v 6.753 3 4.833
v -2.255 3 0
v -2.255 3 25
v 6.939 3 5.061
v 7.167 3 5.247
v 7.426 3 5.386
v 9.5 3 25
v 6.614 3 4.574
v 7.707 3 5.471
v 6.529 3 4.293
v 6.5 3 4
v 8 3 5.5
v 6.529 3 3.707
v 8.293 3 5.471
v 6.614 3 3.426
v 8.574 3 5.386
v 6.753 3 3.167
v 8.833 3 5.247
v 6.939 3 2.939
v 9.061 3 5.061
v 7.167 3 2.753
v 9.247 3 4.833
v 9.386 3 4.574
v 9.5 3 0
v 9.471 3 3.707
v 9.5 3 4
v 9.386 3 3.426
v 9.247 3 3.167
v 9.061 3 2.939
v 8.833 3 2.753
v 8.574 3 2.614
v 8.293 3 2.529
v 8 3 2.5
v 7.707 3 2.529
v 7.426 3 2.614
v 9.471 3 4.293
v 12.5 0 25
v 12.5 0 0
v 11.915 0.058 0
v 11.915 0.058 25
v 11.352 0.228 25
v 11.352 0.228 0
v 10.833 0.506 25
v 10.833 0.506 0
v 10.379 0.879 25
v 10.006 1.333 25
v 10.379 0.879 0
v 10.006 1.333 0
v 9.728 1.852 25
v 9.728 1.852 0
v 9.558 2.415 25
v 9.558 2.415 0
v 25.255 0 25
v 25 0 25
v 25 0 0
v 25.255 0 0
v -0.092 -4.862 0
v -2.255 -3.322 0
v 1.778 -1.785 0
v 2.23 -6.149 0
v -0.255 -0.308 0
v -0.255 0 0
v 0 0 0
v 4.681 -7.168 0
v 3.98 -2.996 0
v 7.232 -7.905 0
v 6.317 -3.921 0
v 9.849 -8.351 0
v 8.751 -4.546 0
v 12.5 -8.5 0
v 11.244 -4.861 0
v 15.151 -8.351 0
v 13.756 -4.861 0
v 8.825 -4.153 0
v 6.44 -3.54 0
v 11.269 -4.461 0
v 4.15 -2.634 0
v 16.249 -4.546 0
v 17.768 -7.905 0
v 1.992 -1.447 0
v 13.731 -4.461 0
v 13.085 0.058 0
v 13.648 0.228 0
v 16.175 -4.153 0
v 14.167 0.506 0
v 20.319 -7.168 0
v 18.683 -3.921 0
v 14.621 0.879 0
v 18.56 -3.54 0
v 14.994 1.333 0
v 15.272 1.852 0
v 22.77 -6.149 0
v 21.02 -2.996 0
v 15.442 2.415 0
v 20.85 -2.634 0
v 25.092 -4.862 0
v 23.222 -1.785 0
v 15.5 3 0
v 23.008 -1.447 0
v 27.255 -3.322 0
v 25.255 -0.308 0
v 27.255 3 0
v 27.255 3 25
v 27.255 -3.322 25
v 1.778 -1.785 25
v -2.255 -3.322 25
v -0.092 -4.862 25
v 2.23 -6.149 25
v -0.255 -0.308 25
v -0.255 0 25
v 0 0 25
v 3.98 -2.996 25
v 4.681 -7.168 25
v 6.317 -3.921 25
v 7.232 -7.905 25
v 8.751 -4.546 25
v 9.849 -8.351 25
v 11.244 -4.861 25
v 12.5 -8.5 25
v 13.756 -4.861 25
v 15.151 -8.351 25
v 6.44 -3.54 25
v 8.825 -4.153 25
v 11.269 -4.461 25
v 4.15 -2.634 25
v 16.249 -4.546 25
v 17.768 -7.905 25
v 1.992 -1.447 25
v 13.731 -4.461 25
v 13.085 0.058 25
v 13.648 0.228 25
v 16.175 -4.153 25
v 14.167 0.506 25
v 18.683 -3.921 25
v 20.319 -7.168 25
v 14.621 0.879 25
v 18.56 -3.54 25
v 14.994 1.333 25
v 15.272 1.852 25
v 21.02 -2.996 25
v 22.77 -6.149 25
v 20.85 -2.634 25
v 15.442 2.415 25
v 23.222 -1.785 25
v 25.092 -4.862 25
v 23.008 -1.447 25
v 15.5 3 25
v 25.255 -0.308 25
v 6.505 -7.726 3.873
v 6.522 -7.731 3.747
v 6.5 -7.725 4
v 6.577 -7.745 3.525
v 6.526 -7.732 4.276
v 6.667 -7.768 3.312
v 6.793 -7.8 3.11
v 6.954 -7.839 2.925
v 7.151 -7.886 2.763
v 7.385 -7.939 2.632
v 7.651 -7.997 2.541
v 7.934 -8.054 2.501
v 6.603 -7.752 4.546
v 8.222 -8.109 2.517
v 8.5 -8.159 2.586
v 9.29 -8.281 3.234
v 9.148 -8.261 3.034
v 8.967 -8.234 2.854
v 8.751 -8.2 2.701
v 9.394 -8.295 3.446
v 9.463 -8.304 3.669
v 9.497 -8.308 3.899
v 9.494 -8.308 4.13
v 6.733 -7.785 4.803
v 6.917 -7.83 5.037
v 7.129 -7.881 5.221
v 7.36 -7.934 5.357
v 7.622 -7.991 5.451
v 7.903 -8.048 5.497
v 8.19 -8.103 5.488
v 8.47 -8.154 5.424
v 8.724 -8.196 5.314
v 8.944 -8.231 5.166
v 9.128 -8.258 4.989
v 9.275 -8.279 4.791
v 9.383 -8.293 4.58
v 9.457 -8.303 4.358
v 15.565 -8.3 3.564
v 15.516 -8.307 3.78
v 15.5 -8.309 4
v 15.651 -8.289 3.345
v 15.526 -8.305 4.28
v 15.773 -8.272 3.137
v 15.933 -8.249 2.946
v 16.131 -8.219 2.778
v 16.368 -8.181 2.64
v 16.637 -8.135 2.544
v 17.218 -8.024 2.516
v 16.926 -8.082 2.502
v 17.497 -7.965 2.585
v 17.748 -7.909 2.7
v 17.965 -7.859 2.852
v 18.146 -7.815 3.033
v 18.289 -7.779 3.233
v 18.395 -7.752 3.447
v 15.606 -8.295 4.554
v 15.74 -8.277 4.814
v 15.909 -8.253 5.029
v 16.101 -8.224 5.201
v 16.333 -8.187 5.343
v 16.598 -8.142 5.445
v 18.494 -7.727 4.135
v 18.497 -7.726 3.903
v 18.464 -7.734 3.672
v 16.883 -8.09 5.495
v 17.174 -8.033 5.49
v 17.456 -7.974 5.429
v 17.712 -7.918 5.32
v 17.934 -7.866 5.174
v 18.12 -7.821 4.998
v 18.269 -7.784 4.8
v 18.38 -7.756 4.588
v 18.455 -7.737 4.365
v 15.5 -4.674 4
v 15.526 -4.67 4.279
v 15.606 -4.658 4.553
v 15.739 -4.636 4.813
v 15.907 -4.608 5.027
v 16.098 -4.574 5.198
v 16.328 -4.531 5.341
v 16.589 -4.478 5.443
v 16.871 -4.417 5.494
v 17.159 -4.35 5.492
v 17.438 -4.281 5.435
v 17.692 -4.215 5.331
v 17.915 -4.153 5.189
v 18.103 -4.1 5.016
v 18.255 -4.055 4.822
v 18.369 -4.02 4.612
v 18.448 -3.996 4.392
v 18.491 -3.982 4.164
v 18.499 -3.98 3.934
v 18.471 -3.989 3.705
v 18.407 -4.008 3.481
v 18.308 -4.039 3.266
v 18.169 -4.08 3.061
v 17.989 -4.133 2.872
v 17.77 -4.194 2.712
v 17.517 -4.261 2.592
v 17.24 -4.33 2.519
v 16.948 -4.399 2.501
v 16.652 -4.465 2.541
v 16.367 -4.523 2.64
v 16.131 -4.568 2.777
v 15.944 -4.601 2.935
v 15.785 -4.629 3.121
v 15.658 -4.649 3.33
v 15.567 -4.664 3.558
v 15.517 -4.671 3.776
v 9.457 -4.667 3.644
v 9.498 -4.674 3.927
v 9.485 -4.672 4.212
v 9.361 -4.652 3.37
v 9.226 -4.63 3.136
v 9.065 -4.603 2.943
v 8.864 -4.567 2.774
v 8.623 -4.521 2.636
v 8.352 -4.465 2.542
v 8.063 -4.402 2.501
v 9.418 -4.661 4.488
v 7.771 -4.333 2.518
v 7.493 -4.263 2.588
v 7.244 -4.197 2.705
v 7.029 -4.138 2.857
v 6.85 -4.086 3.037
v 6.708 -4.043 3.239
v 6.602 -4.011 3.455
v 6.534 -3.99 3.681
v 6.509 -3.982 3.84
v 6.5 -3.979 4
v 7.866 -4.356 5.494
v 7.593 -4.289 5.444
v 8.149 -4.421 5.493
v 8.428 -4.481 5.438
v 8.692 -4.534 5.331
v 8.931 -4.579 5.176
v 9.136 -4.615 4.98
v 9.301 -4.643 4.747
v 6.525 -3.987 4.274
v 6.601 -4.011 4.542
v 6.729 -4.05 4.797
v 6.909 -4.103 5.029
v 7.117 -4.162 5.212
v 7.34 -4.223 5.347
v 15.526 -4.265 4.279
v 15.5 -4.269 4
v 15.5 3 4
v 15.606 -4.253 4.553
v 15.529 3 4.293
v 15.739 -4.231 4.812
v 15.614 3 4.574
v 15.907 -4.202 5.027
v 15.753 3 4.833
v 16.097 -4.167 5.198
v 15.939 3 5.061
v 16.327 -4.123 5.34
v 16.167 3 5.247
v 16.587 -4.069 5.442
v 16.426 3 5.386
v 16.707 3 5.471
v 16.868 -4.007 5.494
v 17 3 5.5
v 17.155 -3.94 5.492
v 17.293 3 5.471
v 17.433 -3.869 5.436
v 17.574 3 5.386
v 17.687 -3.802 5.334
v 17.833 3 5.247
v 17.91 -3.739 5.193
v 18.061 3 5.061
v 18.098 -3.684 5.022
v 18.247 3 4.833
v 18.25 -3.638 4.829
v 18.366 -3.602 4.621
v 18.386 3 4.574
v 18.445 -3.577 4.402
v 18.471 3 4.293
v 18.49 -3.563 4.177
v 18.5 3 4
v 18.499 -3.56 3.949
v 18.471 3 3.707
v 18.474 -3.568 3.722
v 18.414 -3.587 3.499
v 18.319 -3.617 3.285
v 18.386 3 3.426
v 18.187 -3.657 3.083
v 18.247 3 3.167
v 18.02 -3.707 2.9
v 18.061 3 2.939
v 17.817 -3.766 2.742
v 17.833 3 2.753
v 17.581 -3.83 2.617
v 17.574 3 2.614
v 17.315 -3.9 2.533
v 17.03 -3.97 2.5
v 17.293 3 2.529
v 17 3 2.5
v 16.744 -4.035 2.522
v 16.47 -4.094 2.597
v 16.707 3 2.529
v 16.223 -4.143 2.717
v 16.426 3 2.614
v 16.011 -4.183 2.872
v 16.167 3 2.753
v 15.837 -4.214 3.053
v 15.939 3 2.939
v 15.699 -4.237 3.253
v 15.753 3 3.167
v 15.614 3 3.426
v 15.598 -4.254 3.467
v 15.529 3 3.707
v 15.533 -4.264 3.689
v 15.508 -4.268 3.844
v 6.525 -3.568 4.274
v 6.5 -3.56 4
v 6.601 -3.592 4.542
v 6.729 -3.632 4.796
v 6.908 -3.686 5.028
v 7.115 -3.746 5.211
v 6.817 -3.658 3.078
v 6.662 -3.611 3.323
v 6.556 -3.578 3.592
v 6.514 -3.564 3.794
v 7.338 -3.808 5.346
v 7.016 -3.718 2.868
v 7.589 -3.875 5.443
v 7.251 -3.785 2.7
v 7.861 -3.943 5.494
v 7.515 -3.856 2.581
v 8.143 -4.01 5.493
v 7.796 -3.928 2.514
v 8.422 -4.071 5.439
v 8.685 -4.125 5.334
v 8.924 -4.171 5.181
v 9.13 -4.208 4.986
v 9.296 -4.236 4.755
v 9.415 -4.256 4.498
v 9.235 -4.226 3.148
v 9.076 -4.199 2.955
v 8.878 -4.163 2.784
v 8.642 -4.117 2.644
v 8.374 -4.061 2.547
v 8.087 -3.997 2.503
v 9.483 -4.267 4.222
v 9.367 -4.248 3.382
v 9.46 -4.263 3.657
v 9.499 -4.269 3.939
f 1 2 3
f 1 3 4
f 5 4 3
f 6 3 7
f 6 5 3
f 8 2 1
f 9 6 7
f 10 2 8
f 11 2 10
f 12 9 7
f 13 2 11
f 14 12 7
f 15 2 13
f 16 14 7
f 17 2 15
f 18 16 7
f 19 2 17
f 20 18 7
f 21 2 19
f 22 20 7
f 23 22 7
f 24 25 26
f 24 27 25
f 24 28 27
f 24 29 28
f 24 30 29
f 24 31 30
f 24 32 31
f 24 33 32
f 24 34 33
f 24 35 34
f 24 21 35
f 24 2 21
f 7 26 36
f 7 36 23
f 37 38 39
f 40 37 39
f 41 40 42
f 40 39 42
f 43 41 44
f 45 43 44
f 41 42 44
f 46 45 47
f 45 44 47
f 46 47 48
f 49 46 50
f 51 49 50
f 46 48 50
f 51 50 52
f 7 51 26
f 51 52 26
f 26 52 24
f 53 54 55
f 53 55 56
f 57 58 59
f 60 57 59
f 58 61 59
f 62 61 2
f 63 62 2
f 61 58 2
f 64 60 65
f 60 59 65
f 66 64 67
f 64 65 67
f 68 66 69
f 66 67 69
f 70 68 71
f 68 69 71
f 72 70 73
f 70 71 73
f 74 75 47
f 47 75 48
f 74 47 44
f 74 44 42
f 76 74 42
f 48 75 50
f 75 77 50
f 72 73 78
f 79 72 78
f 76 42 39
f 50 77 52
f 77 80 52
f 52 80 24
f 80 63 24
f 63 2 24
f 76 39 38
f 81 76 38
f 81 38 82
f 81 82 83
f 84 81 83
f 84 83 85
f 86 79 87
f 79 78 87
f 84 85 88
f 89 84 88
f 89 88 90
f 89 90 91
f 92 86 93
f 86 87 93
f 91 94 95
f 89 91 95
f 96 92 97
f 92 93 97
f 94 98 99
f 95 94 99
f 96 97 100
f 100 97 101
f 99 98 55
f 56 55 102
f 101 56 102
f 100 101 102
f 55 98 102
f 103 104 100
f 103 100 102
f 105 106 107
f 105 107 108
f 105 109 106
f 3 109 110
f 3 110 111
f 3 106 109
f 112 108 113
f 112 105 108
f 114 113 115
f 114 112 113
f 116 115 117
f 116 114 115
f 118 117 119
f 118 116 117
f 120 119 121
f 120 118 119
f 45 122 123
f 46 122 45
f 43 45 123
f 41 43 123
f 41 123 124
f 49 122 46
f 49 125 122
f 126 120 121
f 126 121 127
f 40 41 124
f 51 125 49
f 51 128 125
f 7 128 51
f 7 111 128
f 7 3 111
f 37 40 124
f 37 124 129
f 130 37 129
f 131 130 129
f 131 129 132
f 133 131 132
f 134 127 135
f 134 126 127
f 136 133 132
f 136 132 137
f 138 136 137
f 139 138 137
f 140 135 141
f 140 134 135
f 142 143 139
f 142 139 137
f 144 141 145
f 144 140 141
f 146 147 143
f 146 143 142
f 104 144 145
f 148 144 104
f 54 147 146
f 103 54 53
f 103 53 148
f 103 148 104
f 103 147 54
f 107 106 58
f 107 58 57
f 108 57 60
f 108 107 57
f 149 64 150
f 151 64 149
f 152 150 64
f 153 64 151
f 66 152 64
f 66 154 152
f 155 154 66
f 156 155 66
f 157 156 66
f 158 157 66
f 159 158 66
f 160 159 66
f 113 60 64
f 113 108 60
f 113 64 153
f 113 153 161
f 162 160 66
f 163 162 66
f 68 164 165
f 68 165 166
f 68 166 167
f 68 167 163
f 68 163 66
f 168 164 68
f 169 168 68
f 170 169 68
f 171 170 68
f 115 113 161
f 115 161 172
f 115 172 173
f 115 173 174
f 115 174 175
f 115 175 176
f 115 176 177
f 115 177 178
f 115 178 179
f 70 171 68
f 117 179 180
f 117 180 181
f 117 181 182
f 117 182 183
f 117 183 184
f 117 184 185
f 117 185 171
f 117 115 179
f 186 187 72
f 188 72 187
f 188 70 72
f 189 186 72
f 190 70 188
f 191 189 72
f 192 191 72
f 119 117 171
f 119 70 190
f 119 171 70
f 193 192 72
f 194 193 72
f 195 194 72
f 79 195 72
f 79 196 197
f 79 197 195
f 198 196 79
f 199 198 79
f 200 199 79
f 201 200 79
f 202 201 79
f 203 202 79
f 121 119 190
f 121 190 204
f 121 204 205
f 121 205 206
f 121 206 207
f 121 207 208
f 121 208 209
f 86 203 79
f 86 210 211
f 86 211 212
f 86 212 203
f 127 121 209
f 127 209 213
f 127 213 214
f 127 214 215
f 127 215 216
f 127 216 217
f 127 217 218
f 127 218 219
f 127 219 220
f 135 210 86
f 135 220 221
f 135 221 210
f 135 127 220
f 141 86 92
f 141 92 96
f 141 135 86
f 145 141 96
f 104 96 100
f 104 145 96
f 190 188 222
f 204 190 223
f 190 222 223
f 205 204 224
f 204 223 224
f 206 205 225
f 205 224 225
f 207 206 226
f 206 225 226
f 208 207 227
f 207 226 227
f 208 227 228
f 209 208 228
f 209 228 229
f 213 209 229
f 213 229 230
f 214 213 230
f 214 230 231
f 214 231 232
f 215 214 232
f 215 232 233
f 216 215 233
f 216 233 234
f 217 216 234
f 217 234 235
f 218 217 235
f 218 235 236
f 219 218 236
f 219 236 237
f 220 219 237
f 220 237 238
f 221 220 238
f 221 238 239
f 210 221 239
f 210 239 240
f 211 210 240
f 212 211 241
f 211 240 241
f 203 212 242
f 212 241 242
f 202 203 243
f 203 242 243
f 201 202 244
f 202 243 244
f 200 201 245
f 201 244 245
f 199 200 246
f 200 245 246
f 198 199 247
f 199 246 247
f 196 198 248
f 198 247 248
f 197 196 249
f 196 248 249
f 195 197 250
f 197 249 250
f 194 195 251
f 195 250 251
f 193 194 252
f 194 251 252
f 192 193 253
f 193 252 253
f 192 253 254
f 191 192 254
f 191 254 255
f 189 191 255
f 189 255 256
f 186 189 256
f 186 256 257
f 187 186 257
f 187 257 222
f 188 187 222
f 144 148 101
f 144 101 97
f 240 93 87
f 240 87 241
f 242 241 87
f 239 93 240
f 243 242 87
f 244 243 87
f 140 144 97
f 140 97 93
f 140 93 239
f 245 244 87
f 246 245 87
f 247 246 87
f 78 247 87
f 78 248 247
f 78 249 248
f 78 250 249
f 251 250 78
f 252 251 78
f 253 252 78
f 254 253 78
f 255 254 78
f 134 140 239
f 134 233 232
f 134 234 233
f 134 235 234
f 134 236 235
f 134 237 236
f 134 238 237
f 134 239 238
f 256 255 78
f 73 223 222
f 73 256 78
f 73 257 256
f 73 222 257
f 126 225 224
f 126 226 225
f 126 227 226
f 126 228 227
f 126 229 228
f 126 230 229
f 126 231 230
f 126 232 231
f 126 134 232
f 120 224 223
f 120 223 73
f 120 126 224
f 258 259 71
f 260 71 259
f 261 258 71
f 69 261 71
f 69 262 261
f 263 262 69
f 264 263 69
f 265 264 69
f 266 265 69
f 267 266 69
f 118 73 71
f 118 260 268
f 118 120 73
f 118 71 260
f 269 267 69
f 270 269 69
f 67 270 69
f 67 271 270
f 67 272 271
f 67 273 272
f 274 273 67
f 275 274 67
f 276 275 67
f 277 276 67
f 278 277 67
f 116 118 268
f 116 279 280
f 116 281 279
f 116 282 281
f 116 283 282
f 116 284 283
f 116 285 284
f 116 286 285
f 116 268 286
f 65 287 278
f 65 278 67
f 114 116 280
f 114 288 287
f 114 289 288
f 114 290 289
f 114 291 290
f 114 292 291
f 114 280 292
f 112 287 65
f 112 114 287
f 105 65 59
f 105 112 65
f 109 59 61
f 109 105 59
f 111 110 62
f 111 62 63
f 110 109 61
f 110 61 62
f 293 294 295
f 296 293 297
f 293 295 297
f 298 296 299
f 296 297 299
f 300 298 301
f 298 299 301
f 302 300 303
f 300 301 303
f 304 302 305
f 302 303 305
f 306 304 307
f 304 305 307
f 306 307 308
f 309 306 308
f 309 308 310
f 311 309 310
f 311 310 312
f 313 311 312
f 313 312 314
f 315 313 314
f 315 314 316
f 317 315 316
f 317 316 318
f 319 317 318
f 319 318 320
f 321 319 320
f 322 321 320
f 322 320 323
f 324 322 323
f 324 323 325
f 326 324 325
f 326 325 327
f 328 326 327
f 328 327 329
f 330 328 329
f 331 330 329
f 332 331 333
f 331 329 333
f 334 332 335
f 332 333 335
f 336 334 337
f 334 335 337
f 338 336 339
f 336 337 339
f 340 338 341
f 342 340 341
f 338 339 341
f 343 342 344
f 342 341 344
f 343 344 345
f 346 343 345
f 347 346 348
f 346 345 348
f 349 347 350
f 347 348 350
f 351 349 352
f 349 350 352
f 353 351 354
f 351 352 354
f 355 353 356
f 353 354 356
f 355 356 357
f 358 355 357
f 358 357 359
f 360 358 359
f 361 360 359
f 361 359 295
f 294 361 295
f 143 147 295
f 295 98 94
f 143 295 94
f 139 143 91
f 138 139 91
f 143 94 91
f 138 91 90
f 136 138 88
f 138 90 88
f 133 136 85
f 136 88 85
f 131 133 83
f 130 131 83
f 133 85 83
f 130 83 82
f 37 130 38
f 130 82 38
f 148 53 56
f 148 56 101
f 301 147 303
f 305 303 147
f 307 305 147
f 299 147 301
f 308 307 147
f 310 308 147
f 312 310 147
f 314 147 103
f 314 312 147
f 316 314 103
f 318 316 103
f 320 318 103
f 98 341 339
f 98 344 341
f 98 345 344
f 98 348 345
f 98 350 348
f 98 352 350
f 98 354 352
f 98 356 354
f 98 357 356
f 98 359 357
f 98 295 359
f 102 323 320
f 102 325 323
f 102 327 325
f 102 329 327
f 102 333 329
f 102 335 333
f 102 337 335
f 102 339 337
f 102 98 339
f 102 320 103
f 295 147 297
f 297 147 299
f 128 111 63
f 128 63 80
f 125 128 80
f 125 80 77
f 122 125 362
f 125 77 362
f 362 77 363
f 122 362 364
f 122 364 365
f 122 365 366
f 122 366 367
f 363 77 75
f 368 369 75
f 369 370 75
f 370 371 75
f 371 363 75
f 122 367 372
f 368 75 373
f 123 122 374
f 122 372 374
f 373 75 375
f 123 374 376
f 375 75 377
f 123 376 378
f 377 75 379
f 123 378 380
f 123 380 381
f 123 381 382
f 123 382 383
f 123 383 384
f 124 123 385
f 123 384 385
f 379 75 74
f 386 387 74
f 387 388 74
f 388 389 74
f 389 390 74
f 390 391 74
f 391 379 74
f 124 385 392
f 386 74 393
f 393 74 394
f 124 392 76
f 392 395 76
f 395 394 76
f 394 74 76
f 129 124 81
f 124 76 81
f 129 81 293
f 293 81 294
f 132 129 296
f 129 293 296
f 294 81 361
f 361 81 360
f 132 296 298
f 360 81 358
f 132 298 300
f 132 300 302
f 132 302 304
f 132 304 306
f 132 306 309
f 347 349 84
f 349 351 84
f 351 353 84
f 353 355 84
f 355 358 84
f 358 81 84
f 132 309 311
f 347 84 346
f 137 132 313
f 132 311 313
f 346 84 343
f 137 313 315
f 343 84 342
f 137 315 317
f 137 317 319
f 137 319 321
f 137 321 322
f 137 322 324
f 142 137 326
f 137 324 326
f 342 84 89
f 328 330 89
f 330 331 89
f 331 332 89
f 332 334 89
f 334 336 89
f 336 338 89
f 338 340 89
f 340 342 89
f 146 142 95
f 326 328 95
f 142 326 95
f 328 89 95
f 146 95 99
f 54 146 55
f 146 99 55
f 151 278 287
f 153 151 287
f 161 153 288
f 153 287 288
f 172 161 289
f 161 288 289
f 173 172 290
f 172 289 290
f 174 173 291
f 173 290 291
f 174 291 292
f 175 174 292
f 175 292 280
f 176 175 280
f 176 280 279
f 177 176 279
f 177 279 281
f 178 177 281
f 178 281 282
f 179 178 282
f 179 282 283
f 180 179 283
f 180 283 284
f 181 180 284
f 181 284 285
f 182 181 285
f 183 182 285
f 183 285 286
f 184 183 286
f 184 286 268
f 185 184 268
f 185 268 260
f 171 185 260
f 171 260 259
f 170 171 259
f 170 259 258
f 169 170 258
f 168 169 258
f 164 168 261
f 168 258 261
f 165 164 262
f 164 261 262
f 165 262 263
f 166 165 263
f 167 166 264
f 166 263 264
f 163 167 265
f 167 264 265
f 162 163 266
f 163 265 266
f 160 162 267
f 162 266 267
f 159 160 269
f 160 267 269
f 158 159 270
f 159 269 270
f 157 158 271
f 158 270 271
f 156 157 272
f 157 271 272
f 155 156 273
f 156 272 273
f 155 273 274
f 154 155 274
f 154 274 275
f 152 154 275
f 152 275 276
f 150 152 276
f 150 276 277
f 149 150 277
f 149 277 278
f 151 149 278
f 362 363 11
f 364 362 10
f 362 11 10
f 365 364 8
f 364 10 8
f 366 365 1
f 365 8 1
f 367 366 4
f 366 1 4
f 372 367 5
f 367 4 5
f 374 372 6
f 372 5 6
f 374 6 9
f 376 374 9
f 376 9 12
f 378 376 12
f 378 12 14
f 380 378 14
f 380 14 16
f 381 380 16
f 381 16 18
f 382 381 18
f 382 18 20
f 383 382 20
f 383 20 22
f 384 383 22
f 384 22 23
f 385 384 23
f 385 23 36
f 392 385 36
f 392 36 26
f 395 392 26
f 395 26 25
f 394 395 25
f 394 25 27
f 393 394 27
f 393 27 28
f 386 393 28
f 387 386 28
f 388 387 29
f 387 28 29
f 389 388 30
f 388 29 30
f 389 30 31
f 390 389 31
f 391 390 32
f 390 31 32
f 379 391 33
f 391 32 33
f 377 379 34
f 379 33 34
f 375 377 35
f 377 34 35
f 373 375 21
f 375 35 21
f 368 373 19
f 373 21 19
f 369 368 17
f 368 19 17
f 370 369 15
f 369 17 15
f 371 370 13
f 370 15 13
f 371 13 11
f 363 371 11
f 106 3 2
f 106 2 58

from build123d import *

# Parameters (mm, degrees)
F0_W     = 25
F0_H     = 3
F1_DEPTH = 25
F3_DEPTH = 25
F4_R     = 1.5
F5_DEPTH = 25
F8_DEPTH = 25


with BuildPart() as f1:
    # F0 (on Top) → F1 (new body)
    with BuildSketch(Plane.XY):
        with Locations((12.5, 1.5)):
            Rectangle(F0_W, F0_H)
        with BuildLine():
            Line((25, 0), (0, 0))
            ThreePointArc((0, 0), (12.5, -4.5), (25, 0))
        make_face()
    extrude(amount=F1_DEPTH)


with BuildPart() as f3:
    # F2 (on face) → F3 (new body)
    with BuildSketch(Plane.XY.offset(25)):
        Polygon((-2.254958, -0.308215), (-0.254958, -0.308215), (-0.254958, 0), (0, 0), (0, 3), (-2.254958, 3), align=None)
        with BuildLine():
            ThreePointArc((25.254958, -0.308215), (12.5, -4.9), (-0.254958, -0.308215))
            Line((-0.254958, -0.308215), (-2.254958, -0.308215))
            Line((-2.254958, -0.308215), (-2.254958, -3.321898))
            ThreePointArc((-2.254958, -3.321898), (12.5, -8.5), (27.254958, -3.321898))
            Line((27.254958, -3.321898), (27.254958, -0.308215))
            Line((27.254958, -0.308215), (25.254958, -0.308215))
        make_face()
        Polygon((25.254958, 0), (25.254958, -0.308215), (27.254958, -0.308215), (27.254958, 3), (25, 3), (25, 0), align=None)
    extrude(amount=-F3_DEPTH)


with BuildPart() as f5_tool:
    # F4 (on face) → F5 (new body)
    with BuildSketch(Plane(origin=(0, 3, 0), x_dir=(-1, 0, 0), z_dir=(0, 1, 0))):
        with Locations((-17, 4)):
            Circle(F4_R)
        with Locations((-8, 4)):
            Circle(F4_R)
    extrude(amount=-F5_DEPTH)


with BuildPart() as f1_1:
    add(f1.part)

    # F5: cut by f5_tool
    add(f5_tool.part, mode=Mode.SUBTRACT)


with BuildPart() as f3_1:
    add(f3.part)

    # F5: cut by f5_tool
    add(f5_tool.part, mode=Mode.SUBTRACT)

    # F6: union F1
    add(f1_1.part)

    # F7 (on face) → F8 (cut)
    with BuildSketch(Plane(origin=(0, 0, 0), x_dir=(1, 0, 0), z_dir=(0, 0, -1))):
        with BuildLine():
            Line((12.5, 0), (12.5, -3))
            Line((12.5, -3), (15.5, -3))
            ThreePointArc((15.5, -3), (14.62132, -0.87868), (12.5, 0))
        make_face()
        with BuildLine():
            Line((9.5, -3), (12.5, -3))
            Line((12.5, -3), (12.5, 0))
            ThreePointArc((12.5, 0), (10.37868, -0.87868), (9.5, -3))
        make_face()
    extrude(amount=-F8_DEPTH, mode=Mode.SUBTRACT)


solid = f3_1.part
